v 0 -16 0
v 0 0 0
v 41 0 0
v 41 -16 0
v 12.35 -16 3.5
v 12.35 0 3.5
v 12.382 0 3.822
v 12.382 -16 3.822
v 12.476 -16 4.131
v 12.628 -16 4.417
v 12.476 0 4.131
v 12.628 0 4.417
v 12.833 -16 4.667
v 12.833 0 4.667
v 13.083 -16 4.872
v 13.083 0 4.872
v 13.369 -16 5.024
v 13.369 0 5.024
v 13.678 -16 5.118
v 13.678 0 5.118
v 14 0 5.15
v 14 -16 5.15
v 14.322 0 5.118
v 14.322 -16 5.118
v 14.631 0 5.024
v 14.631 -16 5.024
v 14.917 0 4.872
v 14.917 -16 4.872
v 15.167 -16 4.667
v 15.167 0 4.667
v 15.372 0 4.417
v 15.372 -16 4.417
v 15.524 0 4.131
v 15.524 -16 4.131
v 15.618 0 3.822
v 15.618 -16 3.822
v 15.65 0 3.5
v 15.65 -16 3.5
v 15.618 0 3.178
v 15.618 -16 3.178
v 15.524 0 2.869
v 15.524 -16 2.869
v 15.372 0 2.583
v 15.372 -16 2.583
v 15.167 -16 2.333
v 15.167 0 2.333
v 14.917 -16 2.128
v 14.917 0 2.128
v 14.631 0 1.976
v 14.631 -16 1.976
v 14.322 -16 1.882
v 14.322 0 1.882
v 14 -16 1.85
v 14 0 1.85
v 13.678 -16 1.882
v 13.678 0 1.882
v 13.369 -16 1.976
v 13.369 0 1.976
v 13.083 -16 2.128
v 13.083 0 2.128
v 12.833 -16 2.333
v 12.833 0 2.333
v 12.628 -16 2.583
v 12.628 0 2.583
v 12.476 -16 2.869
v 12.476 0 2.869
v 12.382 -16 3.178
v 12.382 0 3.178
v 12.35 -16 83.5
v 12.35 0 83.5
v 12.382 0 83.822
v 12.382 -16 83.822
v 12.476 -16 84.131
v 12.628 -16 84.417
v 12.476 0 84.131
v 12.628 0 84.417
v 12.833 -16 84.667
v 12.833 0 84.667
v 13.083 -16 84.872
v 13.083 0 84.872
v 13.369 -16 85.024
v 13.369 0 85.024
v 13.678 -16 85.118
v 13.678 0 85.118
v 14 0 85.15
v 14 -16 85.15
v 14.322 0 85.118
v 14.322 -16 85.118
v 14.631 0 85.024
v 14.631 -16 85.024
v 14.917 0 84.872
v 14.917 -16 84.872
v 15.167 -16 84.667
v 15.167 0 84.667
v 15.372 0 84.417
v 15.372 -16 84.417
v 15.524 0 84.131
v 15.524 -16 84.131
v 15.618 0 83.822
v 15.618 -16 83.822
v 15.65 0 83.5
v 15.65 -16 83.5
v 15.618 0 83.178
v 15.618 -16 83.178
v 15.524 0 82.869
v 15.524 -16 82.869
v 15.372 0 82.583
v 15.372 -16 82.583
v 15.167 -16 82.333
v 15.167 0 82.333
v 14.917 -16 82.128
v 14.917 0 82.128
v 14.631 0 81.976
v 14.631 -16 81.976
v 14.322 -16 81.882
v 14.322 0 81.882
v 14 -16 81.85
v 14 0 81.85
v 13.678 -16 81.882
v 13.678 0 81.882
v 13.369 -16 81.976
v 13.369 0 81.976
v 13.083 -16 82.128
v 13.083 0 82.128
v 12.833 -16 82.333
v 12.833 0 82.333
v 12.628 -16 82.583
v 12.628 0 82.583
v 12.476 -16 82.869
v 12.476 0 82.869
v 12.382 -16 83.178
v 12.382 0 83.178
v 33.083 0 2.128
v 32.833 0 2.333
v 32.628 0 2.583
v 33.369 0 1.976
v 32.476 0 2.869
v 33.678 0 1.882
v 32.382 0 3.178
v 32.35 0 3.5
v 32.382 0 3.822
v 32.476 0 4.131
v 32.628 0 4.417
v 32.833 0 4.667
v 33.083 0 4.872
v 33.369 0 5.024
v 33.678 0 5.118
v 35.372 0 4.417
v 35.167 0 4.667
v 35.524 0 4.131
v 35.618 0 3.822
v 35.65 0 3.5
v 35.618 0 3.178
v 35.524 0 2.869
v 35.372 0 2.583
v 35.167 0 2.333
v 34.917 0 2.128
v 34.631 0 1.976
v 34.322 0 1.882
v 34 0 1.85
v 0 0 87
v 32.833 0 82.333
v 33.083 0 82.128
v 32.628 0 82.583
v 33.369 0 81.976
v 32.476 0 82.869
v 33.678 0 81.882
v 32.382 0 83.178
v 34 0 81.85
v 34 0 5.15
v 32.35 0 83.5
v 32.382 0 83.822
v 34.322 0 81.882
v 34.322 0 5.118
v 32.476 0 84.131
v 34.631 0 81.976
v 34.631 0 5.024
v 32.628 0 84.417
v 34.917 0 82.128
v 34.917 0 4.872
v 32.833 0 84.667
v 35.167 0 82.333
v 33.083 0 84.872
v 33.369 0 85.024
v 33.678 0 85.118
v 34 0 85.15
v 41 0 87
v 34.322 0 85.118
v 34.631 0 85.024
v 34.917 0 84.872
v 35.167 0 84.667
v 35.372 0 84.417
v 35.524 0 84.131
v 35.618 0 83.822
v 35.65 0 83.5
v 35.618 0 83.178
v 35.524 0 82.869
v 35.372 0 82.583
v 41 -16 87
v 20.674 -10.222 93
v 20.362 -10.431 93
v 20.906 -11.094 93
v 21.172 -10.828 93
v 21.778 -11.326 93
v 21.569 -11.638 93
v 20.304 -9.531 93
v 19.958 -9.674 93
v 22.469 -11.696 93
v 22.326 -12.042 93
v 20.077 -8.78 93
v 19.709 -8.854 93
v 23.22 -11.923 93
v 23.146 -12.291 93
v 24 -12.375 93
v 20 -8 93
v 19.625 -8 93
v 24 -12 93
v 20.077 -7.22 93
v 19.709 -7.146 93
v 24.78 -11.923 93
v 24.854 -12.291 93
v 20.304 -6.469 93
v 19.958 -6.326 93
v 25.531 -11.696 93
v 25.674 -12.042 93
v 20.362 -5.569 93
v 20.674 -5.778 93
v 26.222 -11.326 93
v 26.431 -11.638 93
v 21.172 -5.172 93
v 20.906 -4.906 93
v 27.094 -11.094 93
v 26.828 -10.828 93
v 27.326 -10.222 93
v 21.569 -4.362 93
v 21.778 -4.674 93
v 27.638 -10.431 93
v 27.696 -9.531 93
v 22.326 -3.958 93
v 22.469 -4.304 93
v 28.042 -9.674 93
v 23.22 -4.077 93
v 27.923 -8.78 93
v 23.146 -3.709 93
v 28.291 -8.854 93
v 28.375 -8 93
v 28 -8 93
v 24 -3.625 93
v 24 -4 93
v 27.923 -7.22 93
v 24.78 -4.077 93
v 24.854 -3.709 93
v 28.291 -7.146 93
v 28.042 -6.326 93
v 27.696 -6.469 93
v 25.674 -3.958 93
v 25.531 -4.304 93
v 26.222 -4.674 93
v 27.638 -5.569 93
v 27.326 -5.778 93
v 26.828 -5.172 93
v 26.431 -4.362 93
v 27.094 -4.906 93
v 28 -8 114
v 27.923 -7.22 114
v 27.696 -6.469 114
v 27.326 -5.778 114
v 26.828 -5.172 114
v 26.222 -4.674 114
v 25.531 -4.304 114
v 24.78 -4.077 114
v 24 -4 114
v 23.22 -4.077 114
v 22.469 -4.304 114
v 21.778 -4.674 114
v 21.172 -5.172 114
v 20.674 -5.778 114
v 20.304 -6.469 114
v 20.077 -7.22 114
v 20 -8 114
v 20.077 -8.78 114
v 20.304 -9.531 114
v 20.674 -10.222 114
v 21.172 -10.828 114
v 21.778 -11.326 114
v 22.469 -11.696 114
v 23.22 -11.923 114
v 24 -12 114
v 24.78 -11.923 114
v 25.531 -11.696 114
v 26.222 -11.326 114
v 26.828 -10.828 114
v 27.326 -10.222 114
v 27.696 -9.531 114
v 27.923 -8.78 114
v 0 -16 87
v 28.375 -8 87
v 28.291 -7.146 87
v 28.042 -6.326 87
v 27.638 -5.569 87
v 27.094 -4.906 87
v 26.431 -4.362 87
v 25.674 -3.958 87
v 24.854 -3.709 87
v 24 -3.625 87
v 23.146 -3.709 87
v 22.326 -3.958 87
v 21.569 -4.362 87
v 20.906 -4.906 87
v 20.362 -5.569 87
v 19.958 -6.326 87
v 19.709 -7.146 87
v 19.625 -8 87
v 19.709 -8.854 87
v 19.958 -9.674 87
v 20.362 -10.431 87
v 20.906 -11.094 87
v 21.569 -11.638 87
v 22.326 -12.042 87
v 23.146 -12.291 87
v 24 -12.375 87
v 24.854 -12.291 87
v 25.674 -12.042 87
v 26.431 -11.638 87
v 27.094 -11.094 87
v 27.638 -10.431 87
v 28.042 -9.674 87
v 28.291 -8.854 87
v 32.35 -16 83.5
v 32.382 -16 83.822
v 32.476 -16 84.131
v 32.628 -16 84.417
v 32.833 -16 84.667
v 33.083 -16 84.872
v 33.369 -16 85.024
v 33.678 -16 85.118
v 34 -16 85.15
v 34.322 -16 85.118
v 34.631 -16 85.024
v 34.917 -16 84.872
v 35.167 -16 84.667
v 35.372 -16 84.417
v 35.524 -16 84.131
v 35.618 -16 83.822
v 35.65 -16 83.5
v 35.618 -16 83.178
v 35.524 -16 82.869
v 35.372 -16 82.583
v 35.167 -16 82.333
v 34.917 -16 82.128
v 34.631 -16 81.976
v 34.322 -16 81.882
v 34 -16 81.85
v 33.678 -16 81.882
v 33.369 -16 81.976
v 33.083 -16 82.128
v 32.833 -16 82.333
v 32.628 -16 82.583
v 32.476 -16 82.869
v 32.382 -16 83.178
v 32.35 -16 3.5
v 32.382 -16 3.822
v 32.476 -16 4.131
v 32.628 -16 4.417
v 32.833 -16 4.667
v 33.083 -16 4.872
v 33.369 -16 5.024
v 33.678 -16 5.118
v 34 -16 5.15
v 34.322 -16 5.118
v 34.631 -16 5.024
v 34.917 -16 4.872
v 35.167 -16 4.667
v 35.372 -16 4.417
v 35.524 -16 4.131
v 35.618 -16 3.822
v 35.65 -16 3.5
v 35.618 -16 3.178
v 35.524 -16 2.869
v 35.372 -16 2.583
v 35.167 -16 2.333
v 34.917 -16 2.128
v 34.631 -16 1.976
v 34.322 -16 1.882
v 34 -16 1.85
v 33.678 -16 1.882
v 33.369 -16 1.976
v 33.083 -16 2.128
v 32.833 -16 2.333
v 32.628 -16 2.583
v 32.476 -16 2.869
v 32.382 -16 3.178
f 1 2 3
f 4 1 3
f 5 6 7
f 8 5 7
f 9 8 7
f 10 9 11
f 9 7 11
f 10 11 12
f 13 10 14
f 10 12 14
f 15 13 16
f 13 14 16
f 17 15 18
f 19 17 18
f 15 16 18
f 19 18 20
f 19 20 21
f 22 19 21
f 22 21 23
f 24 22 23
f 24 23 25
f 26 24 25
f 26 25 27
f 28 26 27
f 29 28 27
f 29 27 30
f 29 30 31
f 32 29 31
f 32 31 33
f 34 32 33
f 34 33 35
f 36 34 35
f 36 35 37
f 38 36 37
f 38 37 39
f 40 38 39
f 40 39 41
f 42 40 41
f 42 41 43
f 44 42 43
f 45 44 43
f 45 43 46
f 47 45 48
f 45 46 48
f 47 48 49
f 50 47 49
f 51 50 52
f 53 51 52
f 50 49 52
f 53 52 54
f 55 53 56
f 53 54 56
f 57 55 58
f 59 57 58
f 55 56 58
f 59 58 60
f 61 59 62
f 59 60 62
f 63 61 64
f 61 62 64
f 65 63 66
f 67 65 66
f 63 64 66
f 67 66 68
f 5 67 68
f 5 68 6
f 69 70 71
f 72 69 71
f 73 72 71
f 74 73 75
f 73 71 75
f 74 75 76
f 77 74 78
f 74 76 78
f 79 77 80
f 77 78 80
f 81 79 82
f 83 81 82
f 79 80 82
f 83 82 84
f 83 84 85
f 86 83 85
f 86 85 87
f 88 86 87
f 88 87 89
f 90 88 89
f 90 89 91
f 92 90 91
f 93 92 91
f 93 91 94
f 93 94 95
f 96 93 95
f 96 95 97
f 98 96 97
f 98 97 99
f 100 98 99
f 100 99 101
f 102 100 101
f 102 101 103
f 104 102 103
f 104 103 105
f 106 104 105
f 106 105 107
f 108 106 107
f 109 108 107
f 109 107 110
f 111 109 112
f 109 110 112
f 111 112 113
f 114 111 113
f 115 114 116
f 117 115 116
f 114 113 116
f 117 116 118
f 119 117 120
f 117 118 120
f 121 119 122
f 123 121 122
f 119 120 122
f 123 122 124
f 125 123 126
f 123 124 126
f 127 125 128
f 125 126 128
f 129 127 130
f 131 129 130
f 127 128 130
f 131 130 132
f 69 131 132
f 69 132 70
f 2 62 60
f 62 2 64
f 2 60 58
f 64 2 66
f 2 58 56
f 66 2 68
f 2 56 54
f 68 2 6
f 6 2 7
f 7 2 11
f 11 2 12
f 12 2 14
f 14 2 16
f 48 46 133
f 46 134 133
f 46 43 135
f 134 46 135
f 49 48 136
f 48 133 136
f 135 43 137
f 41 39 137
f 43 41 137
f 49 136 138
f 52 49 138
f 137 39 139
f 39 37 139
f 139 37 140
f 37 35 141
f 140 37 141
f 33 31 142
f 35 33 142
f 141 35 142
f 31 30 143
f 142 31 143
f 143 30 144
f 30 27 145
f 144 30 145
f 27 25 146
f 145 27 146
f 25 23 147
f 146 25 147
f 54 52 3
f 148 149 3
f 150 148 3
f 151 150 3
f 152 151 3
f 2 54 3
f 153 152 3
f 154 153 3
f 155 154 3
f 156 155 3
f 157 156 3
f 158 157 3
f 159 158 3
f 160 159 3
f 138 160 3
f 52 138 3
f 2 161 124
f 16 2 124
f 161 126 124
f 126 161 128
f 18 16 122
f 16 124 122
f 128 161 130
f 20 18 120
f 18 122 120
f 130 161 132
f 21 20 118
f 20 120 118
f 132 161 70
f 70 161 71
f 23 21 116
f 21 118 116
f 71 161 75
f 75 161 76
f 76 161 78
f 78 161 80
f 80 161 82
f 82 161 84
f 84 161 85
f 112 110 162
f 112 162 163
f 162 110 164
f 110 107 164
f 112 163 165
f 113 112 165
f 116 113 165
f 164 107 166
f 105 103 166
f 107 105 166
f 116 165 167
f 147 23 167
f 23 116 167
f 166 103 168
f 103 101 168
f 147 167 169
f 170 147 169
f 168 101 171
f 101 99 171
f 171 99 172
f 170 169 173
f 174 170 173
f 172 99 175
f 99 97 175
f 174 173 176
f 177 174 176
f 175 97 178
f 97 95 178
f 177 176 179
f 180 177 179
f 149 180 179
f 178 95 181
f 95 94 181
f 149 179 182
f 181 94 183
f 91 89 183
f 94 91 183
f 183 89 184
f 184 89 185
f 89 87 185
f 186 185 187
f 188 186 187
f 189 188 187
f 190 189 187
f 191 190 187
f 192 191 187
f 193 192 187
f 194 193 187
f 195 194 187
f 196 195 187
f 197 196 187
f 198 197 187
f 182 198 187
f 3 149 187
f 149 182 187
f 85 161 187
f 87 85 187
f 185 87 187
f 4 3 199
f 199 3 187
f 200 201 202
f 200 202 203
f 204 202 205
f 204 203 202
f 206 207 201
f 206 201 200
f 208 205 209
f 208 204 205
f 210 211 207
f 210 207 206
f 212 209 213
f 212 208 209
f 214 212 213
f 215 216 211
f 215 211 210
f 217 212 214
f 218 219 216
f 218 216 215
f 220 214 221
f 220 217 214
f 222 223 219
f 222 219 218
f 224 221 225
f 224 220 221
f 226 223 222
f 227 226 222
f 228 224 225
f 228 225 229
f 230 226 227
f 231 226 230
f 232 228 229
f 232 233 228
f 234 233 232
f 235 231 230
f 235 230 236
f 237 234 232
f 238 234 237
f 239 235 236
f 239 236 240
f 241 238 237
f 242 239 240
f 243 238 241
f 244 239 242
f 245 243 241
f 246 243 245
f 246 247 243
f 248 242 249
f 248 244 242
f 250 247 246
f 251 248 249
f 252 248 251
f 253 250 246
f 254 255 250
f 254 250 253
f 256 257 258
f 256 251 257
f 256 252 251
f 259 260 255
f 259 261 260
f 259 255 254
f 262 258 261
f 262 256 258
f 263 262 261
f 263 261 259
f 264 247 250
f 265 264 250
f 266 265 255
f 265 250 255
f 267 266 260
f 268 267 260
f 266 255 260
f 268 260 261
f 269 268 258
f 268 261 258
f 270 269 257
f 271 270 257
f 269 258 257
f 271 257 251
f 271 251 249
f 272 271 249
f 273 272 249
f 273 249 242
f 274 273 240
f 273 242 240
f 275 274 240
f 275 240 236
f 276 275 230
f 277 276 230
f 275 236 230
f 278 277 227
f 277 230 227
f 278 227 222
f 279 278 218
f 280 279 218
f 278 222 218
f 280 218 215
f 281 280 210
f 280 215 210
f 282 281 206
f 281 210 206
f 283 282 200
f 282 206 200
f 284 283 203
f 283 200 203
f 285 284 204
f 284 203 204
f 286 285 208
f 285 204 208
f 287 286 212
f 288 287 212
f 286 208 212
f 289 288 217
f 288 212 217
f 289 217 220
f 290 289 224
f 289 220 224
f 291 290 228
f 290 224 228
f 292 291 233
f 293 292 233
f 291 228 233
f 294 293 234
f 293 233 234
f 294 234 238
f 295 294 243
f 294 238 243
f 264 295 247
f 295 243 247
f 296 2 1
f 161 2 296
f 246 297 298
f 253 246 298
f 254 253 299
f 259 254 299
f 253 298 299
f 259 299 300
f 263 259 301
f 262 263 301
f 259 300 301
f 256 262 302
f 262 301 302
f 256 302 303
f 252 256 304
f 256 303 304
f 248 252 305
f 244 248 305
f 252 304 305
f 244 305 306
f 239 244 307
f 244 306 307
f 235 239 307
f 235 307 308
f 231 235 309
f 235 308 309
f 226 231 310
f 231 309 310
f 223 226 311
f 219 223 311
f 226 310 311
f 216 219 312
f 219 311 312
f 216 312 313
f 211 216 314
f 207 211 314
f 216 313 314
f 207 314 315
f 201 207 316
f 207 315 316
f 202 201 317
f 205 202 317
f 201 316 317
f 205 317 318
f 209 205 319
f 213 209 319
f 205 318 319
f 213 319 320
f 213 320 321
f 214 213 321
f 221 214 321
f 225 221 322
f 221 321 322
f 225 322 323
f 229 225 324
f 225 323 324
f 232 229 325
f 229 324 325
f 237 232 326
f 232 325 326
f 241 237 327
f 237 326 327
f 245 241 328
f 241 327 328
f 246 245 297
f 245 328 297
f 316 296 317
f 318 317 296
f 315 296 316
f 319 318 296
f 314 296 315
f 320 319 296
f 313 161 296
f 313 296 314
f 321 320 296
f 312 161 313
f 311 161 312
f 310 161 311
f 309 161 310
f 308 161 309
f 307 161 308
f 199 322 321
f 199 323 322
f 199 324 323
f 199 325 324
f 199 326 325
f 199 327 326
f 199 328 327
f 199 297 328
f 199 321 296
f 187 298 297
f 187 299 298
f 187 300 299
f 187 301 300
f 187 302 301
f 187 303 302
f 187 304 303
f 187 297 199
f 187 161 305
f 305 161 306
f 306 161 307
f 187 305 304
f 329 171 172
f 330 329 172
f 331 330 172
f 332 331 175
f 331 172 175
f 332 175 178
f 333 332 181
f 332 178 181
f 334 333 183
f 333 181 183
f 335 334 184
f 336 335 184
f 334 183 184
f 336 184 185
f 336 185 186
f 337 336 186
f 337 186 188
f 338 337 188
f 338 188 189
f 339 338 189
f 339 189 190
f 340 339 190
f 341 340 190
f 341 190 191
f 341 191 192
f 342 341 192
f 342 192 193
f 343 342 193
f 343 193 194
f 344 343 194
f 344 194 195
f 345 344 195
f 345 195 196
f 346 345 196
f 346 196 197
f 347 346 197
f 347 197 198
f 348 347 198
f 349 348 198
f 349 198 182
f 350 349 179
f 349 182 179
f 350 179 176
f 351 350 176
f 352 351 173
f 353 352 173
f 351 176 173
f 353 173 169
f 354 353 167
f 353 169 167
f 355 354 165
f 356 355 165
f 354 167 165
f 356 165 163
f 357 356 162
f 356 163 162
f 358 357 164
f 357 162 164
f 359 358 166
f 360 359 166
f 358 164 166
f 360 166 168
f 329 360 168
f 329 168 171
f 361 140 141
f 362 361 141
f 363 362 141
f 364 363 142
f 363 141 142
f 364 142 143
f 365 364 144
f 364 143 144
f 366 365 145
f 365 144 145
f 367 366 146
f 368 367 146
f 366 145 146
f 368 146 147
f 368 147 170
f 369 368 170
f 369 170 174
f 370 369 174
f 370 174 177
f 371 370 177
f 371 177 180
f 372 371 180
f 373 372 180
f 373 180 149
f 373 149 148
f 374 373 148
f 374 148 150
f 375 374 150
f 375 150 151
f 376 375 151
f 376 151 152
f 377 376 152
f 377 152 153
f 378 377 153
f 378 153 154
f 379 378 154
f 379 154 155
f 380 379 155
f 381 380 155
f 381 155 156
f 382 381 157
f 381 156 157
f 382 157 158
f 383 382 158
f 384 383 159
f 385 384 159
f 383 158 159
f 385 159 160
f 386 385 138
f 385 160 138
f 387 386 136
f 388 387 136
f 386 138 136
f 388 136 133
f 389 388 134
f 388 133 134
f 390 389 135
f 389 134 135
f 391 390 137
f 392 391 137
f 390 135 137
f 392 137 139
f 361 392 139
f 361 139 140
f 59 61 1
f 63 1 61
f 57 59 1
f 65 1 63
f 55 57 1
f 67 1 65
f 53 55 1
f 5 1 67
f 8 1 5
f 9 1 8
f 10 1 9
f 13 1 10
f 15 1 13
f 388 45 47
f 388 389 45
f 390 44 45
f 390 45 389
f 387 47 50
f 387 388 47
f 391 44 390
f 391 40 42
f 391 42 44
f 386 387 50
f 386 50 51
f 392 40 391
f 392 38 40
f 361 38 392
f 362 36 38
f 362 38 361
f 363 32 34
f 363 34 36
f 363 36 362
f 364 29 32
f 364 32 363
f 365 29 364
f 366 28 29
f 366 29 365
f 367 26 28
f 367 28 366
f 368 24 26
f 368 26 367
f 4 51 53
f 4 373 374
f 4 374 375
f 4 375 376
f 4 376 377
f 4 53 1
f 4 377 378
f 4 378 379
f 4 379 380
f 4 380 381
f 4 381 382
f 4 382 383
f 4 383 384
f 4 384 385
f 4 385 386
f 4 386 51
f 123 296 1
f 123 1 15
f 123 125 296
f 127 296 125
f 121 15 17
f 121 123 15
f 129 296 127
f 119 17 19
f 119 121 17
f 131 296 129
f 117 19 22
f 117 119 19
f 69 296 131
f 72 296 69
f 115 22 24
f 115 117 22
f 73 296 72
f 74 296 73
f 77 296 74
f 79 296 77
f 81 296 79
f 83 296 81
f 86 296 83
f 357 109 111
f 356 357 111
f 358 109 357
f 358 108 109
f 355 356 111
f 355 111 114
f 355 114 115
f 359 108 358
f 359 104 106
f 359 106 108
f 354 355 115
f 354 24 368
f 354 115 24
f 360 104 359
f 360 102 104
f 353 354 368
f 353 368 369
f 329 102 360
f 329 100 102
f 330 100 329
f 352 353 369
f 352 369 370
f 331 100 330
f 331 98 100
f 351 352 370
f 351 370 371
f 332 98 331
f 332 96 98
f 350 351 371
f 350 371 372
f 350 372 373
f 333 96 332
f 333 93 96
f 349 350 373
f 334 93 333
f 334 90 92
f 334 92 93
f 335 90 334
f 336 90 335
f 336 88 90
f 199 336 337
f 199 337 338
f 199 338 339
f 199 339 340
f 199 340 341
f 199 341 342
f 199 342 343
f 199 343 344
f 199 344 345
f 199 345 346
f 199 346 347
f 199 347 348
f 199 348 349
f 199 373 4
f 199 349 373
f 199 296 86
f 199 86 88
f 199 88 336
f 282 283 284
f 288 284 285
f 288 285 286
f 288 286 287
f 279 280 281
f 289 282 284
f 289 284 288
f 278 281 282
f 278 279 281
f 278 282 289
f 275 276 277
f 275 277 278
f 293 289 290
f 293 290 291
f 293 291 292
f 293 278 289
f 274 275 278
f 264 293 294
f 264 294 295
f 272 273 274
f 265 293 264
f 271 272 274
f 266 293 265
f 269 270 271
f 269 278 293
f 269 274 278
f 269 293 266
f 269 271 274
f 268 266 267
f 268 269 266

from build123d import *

# Parameters (mm, degrees)
F0_W     = 41
F0_H     = 87
F1_DEPTH = 16
F3_D     = 3.3
F3_DEPTH = 27.7
F3_TIP   = 0.9914200214
F4_R     = 4.375
F5_DEPTH = 6
F6_R     = 4
F7_DEPTH = 21


with BuildPart() as f1:
    # F0 (on Front) → F1 (new body)
    with BuildSketch(Plane.XZ):
        with Locations((20.5, 43.5)):
            Rectangle(F0_W, F0_H)
    extrude(amount=F1_DEPTH)

    # F3
    with Locations(Plane.XZ.offset(16)):
        with Locations((14, 83.5), (34, 83.5), (14, 3.5), (34, 3.5)):
            Hole(F3_D / 2, depth=F3_DEPTH)
            with Locations((0, 0, -(F3_DEPTH + F3_TIP / 2))):  # 118° drill point
                Cone(0, F3_D / 2, F3_TIP, mode=Mode.SUBTRACT)

    # F4 (on face) → F5 (join)
    with BuildSketch(Plane.XY.offset(87)):
        with Locations((24, -8)):
            Circle(F4_R)
    extrude(amount=F5_DEPTH)

    # F6 (on face) → F7 (join)
    with BuildSketch(Plane.XY.offset(93)):
        with Locations((24, -8)):
            Circle(F6_R)
    extrude(amount=F7_DEPTH)


solid = f1.part
